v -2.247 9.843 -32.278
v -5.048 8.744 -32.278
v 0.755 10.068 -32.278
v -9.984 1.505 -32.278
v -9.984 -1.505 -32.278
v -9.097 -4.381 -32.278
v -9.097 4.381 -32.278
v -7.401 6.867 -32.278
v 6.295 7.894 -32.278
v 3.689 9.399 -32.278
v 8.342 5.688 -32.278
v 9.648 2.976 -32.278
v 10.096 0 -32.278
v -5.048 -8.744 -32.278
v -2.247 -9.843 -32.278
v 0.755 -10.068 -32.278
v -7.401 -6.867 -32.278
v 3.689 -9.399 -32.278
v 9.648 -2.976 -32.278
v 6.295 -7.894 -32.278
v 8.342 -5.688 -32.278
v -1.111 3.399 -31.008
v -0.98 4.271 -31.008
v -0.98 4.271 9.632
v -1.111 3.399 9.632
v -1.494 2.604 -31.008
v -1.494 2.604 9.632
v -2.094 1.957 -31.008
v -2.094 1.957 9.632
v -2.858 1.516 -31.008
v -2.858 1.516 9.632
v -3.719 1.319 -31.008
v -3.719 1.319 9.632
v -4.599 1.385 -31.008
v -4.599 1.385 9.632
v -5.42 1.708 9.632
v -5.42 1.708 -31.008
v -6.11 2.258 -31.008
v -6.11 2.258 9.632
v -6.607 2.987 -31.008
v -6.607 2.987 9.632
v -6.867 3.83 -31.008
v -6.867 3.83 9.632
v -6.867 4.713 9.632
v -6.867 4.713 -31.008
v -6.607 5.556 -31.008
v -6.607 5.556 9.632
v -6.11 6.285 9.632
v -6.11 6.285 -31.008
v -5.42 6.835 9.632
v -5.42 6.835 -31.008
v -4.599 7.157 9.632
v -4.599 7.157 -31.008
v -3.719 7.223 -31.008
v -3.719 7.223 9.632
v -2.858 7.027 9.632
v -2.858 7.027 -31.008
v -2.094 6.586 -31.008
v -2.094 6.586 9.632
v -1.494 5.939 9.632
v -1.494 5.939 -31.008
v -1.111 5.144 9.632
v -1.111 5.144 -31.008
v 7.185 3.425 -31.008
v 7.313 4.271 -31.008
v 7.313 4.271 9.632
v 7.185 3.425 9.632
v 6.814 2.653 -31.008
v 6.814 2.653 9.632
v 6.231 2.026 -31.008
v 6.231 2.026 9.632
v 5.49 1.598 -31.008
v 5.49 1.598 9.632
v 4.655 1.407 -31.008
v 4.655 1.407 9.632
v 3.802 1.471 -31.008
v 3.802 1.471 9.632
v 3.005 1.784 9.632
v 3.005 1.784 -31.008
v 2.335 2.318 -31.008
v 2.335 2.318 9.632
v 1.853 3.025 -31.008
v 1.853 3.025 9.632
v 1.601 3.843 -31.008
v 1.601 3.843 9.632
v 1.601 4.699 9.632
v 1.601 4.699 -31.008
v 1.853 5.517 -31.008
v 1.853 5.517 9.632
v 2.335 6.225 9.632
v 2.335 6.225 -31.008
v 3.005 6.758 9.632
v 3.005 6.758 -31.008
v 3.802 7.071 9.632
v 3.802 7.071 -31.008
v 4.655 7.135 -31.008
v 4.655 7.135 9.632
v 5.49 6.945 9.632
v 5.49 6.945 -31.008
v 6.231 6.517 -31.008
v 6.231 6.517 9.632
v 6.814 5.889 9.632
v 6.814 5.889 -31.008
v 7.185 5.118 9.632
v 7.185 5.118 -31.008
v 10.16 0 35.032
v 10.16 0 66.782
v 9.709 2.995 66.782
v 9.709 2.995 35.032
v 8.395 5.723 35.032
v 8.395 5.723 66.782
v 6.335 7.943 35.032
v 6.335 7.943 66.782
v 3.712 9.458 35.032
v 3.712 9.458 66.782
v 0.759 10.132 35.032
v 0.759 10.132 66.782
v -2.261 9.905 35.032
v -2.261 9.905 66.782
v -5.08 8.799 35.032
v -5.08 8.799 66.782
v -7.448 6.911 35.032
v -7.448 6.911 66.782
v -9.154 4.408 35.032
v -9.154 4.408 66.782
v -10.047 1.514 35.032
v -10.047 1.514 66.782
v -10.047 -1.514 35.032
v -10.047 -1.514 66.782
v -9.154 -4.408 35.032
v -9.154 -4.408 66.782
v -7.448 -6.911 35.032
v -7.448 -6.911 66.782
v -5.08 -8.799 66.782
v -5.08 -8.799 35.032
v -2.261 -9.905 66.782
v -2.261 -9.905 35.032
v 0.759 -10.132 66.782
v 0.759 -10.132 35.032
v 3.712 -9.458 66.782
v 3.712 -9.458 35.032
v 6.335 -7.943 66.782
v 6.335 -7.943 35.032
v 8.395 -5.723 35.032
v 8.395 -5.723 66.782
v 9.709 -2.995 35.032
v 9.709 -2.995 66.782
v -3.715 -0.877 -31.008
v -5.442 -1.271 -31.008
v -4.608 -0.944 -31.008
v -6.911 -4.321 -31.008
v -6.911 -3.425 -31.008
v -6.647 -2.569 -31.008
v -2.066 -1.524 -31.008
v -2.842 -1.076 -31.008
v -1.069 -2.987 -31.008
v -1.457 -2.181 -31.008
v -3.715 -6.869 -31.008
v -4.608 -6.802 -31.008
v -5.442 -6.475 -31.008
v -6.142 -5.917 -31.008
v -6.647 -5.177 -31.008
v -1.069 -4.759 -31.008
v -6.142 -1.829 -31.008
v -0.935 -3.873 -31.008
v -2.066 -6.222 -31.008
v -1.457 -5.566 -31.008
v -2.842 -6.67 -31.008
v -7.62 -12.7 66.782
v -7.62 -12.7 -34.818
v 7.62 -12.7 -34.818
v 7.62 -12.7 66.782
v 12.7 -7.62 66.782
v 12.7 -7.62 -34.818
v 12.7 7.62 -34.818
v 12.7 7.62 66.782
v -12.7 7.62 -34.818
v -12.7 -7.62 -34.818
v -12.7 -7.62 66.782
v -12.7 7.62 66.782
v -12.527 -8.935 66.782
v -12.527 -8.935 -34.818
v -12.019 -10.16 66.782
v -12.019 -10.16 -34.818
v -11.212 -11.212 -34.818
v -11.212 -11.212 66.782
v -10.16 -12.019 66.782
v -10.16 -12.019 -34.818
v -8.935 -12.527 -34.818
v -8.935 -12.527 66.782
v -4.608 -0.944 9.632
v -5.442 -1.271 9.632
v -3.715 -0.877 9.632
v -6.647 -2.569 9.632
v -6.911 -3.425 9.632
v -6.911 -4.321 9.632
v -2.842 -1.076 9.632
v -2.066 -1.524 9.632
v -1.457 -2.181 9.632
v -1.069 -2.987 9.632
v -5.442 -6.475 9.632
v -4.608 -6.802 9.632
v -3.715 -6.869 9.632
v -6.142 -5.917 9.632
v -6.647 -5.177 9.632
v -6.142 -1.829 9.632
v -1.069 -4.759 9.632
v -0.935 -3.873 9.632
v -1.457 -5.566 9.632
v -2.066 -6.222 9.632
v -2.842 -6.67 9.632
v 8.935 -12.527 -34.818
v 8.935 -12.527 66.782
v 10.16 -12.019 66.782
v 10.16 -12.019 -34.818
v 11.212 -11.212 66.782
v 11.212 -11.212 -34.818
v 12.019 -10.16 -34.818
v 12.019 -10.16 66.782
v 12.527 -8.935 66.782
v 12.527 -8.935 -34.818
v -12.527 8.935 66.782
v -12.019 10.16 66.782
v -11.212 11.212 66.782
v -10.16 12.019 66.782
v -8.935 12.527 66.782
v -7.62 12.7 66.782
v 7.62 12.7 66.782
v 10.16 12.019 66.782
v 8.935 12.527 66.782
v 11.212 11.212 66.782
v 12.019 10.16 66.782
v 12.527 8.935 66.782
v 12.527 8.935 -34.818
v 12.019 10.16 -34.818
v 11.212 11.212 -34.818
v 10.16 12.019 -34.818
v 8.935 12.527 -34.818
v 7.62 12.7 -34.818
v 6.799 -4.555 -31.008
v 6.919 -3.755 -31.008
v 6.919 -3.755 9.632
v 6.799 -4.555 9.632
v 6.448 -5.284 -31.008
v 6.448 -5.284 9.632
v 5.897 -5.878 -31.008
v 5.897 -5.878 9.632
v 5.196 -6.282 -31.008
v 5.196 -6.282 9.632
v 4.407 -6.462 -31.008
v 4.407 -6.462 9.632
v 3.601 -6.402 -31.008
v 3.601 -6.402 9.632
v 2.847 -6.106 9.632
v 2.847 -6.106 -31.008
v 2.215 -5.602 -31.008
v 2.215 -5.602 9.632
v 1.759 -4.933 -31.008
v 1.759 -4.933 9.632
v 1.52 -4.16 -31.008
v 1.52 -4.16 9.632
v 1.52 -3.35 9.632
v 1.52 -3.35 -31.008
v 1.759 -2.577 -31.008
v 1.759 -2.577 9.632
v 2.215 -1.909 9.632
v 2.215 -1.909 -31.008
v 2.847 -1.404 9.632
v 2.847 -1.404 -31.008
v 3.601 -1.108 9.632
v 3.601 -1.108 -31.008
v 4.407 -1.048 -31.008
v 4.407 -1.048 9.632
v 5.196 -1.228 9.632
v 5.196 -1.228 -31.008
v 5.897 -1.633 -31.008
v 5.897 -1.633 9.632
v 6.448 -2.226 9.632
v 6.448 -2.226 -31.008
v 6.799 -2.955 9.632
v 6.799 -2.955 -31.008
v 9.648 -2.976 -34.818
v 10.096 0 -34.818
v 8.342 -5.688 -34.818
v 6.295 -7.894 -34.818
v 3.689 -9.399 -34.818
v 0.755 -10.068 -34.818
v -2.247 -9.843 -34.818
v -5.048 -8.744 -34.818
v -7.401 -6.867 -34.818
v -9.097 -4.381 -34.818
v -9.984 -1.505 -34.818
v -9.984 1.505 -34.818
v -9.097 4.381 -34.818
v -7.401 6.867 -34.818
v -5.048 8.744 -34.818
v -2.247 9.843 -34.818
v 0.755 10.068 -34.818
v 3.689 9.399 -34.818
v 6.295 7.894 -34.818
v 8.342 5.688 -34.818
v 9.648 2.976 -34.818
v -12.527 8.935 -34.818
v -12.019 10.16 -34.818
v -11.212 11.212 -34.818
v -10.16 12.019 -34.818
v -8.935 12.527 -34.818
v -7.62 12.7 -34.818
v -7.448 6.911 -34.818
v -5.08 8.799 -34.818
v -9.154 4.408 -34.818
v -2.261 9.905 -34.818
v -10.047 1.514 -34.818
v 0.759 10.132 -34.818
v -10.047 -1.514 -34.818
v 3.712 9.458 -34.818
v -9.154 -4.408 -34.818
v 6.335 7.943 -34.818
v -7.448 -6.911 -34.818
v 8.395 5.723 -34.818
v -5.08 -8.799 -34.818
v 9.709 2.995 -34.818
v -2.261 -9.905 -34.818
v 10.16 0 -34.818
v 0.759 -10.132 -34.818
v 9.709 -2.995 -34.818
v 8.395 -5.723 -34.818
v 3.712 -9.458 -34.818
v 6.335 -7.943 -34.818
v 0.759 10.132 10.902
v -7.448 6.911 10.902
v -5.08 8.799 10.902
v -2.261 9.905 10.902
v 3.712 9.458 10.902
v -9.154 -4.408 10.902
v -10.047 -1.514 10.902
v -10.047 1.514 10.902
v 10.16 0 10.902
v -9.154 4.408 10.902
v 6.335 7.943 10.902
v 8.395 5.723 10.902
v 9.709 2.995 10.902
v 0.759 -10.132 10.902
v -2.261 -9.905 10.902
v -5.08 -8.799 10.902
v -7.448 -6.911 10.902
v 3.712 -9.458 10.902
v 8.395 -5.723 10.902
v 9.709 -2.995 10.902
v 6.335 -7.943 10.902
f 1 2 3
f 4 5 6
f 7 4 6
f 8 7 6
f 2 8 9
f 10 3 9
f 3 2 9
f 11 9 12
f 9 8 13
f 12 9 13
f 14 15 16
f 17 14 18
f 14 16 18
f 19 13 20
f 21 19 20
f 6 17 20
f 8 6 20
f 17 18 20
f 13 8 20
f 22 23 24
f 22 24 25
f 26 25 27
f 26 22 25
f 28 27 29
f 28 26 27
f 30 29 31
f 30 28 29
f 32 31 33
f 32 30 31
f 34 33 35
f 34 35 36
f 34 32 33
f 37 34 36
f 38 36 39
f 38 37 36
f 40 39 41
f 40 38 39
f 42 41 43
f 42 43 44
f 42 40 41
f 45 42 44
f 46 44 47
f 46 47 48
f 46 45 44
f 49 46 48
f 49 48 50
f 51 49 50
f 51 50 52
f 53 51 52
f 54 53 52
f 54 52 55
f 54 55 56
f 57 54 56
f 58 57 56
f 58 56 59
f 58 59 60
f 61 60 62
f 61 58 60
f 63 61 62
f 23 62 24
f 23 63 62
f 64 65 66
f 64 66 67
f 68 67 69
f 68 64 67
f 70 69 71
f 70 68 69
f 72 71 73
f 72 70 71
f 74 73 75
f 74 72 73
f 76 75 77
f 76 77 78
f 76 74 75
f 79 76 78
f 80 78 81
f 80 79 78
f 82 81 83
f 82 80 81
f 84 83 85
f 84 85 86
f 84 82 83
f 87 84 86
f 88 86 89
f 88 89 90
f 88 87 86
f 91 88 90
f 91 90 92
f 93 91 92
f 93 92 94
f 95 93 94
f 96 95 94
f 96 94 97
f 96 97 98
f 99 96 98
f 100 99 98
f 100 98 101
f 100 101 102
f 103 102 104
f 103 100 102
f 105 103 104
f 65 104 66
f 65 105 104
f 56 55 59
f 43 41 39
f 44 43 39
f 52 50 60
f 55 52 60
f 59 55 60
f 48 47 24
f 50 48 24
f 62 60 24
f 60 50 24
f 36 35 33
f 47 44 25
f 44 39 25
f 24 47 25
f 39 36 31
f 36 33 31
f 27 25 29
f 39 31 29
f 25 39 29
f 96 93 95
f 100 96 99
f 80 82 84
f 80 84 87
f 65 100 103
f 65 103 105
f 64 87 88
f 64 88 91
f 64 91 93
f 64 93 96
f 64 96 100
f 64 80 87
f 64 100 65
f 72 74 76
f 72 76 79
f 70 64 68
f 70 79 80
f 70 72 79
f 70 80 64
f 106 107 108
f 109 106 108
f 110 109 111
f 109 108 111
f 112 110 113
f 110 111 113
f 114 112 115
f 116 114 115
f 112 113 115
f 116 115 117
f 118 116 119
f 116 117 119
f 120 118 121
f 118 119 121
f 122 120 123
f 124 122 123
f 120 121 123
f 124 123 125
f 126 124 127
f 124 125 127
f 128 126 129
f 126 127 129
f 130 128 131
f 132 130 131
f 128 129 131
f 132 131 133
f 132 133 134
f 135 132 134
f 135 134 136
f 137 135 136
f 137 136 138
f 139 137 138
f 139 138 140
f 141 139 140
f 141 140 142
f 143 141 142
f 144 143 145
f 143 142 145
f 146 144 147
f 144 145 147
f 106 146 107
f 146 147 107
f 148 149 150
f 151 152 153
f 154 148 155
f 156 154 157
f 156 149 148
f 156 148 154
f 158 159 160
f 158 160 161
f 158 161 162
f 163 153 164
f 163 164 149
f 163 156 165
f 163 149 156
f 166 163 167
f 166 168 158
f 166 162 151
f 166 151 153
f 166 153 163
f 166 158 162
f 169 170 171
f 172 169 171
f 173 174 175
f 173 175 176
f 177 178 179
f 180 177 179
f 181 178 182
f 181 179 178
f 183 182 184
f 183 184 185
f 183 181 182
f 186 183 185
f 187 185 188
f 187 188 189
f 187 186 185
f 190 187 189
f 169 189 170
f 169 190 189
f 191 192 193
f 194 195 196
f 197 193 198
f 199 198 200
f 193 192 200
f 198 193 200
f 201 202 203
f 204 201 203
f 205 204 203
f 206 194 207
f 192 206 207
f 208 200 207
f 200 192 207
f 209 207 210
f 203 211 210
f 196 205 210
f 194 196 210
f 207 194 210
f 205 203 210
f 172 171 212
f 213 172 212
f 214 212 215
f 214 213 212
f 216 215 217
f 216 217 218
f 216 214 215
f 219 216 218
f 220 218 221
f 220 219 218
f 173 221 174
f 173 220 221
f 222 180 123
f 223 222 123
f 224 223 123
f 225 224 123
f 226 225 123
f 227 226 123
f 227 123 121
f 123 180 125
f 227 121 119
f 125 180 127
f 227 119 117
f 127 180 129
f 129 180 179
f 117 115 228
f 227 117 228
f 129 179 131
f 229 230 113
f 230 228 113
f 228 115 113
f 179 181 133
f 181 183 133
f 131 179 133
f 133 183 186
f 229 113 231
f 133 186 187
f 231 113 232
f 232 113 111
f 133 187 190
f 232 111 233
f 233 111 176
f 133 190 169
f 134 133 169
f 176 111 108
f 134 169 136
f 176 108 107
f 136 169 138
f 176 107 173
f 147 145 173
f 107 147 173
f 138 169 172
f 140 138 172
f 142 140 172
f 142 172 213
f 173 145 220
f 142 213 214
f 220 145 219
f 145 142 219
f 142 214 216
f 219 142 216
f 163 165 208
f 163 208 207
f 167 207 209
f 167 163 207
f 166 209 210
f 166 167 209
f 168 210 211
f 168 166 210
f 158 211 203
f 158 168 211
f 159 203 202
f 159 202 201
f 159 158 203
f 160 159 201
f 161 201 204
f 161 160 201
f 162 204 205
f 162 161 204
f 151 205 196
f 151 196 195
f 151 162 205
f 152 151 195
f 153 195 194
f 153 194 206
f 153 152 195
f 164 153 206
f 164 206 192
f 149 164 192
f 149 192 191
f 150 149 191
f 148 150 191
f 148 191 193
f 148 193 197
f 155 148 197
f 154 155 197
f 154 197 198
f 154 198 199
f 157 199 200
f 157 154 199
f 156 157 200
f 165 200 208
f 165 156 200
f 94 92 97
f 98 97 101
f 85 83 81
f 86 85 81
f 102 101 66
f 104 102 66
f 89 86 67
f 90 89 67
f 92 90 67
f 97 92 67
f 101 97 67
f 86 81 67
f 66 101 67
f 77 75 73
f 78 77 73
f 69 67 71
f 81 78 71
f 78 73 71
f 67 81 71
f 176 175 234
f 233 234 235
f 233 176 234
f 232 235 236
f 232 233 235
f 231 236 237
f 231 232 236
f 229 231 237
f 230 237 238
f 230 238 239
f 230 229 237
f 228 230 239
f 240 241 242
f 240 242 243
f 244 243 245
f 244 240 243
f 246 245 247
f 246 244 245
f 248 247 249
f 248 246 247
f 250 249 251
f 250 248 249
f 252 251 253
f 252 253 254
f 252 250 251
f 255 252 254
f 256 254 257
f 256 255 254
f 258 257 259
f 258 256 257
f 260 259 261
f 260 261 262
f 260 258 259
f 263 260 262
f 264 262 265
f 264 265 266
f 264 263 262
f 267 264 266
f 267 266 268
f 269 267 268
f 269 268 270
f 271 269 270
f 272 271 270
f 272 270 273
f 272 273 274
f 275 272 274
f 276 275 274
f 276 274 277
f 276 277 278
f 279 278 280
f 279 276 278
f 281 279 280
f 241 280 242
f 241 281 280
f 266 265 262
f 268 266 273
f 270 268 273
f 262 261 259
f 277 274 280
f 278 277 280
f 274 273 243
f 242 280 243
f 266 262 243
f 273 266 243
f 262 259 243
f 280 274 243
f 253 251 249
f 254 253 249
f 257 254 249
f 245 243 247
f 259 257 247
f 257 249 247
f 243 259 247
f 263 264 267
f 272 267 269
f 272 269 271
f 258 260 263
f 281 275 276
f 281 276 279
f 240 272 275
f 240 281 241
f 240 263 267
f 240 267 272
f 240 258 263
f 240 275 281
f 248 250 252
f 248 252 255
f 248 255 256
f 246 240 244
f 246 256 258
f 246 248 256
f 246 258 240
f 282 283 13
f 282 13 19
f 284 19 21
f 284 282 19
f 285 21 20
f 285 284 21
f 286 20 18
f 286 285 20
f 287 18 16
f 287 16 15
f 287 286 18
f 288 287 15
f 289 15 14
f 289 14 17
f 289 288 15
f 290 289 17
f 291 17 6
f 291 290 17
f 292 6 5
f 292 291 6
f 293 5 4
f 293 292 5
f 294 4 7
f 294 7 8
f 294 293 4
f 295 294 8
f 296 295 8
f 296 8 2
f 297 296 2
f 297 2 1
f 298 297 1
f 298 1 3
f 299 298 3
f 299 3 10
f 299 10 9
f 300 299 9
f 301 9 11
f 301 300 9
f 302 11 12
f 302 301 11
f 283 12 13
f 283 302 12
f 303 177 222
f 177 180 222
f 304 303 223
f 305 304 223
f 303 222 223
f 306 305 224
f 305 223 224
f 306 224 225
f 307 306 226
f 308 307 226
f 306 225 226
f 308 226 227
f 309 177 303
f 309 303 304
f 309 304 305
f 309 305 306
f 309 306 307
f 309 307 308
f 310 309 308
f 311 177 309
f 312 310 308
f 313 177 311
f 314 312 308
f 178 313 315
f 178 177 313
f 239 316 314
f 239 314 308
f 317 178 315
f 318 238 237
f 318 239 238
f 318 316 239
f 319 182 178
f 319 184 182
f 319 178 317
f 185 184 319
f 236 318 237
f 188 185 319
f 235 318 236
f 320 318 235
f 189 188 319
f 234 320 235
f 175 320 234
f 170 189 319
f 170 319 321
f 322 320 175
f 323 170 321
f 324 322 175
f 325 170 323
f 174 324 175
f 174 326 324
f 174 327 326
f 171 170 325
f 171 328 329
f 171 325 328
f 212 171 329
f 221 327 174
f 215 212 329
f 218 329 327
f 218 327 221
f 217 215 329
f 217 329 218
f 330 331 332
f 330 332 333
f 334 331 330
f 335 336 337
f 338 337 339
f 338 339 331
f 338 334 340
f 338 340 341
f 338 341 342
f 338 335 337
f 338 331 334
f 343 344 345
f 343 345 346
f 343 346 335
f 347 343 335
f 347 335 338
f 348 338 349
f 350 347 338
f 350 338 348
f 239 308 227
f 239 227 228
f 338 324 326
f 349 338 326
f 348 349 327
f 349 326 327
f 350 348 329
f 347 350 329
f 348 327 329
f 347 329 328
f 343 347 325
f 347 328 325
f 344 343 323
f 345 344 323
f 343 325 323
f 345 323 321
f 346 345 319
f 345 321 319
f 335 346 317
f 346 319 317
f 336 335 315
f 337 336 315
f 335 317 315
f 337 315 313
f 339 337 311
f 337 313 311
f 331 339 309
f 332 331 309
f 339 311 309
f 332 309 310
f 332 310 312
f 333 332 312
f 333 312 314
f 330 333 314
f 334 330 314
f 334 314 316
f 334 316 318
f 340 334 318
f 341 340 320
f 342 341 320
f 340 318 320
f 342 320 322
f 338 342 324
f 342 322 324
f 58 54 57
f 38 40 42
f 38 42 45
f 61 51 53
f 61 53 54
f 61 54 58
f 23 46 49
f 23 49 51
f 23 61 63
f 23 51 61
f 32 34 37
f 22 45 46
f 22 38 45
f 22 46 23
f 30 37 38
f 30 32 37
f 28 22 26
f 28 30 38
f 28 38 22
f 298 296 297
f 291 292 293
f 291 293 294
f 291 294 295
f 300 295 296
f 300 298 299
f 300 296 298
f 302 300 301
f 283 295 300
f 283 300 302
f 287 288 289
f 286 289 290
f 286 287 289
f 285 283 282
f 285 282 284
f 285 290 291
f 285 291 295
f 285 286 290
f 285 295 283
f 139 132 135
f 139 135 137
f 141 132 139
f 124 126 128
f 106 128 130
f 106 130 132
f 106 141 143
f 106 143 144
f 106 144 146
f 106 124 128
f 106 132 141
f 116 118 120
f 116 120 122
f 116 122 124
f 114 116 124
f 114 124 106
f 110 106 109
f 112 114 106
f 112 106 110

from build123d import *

# Parameters (mm, degrees)
F0_W      = 25.4
F0_H      = 101.6
F1_DEPTH  = 12.7
F2_R      = 5.08
F3_R      = 10.16
F4_DEPTH  = 31.75
F5_R      = 10.16
F6_DEPTH  = 45.72
F8_START  = -3.81
F7_R      = 3.0046886723
F8_DEPTH  = 40.64
F7_R_2    = 2.7148124063
F7_R_3    = 2.9603110359
F7_R_4    = 2.8719223608
F9_R      = 10.0965
F10_DEPTH = 2.54


with BuildPart() as f1:
    # F0 (on Front) → F1 (new body, symmetric)
    with BuildSketch(Plane.XZ):
        with Locations((0, 15.9824670672)):
            Rectangle(F0_W, F0_H)
    extrude(amount=F1_DEPTH, both=True)

    # F2
    f2_edges = [f1.edges().sort_by_distance(p)[0] for p in [
        (-12.7, 12.7, 15.982467),
        (-12.7, -12.7, 15.982467),
        (12.7, 12.7, 15.982467),
        (12.7, -12.7, 15.982467),
    ]]
    fillet(f2_edges, radius=F2_R)

    # F3 (on face) → F4 (cut)
    with BuildSketch(Plane.XY.offset(66.7824670672)):
        Circle(F3_R)
    extrude(amount=-F4_DEPTH, mode=Mode.SUBTRACT)

    # F5 (on face) → F6 (cut)
    with BuildSketch(Plane(origin=(0, 0, -34.8175329328), x_dir=(1, 0, 0), z_dir=(0, 0, -1))):
        Circle(F5_R)
    extrude(amount=-F6_DEPTH, mode=Mode.SUBTRACT)


with BuildPart() as f8:
    # F7 (on face) → F8 (new body)
    with BuildSketch(Plane(origin=(0, 0, -34.8175329328), x_dir=(1, 0, 0), z_dir=(0, 0, -1)).offset(F8_START)):
        with Locations((-3.9398320951, 3.8731449749)):
            Circle(F7_R)
    extrude(amount=-F8_DEPTH)


with BuildPart() as f8b:
    # F7 (on face) → F8, piece 2 (new body)
    with BuildSketch(Plane(origin=(0, 0, -34.8175329328), x_dir=(1, 0, 0), z_dir=(0, 0, -1)).offset(F8_START)):
        with Locations((4.204605706, 3.7551093847)):
            Circle(F7_R_2)
    extrude(amount=-F8_DEPTH)


with BuildPart() as f8c:
    # F7 (on face) → F8, piece 3 (new body)
    with BuildSketch(Plane(origin=(0, 0, -34.8175329328), x_dir=(1, 0, 0), z_dir=(0, 0, -1)).offset(F8_START)):
        with Locations((-3.9398320951, -4.271291662)):
            Circle(F7_R_3)
    extrude(amount=-F8_DEPTH)


with BuildPart() as f8d:
    # F7 (on face) → F8, piece 4 (new body)
    with BuildSketch(Plane(origin=(0, 0, -34.8175329328), x_dir=(1, 0, 0), z_dir=(0, 0, -1)).offset(F8_START)):
        with Locations((4.4406759553, -4.271291662)):
            Circle(F7_R_4)
    extrude(amount=-F8_DEPTH)


with BuildPart() as f10:
    # F9 (on face) → F10 (new body)
    with BuildSketch(Plane(origin=(0, 0, -34.8175329328), x_dir=(1, 0, 0), z_dir=(0, 0, -1))):
        Circle(F9_R)
    extrude(amount=-F10_DEPTH)


solid = Compound([f1.part, f8.part, f8b.part, f8c.part, f8d.part, f10.part])
